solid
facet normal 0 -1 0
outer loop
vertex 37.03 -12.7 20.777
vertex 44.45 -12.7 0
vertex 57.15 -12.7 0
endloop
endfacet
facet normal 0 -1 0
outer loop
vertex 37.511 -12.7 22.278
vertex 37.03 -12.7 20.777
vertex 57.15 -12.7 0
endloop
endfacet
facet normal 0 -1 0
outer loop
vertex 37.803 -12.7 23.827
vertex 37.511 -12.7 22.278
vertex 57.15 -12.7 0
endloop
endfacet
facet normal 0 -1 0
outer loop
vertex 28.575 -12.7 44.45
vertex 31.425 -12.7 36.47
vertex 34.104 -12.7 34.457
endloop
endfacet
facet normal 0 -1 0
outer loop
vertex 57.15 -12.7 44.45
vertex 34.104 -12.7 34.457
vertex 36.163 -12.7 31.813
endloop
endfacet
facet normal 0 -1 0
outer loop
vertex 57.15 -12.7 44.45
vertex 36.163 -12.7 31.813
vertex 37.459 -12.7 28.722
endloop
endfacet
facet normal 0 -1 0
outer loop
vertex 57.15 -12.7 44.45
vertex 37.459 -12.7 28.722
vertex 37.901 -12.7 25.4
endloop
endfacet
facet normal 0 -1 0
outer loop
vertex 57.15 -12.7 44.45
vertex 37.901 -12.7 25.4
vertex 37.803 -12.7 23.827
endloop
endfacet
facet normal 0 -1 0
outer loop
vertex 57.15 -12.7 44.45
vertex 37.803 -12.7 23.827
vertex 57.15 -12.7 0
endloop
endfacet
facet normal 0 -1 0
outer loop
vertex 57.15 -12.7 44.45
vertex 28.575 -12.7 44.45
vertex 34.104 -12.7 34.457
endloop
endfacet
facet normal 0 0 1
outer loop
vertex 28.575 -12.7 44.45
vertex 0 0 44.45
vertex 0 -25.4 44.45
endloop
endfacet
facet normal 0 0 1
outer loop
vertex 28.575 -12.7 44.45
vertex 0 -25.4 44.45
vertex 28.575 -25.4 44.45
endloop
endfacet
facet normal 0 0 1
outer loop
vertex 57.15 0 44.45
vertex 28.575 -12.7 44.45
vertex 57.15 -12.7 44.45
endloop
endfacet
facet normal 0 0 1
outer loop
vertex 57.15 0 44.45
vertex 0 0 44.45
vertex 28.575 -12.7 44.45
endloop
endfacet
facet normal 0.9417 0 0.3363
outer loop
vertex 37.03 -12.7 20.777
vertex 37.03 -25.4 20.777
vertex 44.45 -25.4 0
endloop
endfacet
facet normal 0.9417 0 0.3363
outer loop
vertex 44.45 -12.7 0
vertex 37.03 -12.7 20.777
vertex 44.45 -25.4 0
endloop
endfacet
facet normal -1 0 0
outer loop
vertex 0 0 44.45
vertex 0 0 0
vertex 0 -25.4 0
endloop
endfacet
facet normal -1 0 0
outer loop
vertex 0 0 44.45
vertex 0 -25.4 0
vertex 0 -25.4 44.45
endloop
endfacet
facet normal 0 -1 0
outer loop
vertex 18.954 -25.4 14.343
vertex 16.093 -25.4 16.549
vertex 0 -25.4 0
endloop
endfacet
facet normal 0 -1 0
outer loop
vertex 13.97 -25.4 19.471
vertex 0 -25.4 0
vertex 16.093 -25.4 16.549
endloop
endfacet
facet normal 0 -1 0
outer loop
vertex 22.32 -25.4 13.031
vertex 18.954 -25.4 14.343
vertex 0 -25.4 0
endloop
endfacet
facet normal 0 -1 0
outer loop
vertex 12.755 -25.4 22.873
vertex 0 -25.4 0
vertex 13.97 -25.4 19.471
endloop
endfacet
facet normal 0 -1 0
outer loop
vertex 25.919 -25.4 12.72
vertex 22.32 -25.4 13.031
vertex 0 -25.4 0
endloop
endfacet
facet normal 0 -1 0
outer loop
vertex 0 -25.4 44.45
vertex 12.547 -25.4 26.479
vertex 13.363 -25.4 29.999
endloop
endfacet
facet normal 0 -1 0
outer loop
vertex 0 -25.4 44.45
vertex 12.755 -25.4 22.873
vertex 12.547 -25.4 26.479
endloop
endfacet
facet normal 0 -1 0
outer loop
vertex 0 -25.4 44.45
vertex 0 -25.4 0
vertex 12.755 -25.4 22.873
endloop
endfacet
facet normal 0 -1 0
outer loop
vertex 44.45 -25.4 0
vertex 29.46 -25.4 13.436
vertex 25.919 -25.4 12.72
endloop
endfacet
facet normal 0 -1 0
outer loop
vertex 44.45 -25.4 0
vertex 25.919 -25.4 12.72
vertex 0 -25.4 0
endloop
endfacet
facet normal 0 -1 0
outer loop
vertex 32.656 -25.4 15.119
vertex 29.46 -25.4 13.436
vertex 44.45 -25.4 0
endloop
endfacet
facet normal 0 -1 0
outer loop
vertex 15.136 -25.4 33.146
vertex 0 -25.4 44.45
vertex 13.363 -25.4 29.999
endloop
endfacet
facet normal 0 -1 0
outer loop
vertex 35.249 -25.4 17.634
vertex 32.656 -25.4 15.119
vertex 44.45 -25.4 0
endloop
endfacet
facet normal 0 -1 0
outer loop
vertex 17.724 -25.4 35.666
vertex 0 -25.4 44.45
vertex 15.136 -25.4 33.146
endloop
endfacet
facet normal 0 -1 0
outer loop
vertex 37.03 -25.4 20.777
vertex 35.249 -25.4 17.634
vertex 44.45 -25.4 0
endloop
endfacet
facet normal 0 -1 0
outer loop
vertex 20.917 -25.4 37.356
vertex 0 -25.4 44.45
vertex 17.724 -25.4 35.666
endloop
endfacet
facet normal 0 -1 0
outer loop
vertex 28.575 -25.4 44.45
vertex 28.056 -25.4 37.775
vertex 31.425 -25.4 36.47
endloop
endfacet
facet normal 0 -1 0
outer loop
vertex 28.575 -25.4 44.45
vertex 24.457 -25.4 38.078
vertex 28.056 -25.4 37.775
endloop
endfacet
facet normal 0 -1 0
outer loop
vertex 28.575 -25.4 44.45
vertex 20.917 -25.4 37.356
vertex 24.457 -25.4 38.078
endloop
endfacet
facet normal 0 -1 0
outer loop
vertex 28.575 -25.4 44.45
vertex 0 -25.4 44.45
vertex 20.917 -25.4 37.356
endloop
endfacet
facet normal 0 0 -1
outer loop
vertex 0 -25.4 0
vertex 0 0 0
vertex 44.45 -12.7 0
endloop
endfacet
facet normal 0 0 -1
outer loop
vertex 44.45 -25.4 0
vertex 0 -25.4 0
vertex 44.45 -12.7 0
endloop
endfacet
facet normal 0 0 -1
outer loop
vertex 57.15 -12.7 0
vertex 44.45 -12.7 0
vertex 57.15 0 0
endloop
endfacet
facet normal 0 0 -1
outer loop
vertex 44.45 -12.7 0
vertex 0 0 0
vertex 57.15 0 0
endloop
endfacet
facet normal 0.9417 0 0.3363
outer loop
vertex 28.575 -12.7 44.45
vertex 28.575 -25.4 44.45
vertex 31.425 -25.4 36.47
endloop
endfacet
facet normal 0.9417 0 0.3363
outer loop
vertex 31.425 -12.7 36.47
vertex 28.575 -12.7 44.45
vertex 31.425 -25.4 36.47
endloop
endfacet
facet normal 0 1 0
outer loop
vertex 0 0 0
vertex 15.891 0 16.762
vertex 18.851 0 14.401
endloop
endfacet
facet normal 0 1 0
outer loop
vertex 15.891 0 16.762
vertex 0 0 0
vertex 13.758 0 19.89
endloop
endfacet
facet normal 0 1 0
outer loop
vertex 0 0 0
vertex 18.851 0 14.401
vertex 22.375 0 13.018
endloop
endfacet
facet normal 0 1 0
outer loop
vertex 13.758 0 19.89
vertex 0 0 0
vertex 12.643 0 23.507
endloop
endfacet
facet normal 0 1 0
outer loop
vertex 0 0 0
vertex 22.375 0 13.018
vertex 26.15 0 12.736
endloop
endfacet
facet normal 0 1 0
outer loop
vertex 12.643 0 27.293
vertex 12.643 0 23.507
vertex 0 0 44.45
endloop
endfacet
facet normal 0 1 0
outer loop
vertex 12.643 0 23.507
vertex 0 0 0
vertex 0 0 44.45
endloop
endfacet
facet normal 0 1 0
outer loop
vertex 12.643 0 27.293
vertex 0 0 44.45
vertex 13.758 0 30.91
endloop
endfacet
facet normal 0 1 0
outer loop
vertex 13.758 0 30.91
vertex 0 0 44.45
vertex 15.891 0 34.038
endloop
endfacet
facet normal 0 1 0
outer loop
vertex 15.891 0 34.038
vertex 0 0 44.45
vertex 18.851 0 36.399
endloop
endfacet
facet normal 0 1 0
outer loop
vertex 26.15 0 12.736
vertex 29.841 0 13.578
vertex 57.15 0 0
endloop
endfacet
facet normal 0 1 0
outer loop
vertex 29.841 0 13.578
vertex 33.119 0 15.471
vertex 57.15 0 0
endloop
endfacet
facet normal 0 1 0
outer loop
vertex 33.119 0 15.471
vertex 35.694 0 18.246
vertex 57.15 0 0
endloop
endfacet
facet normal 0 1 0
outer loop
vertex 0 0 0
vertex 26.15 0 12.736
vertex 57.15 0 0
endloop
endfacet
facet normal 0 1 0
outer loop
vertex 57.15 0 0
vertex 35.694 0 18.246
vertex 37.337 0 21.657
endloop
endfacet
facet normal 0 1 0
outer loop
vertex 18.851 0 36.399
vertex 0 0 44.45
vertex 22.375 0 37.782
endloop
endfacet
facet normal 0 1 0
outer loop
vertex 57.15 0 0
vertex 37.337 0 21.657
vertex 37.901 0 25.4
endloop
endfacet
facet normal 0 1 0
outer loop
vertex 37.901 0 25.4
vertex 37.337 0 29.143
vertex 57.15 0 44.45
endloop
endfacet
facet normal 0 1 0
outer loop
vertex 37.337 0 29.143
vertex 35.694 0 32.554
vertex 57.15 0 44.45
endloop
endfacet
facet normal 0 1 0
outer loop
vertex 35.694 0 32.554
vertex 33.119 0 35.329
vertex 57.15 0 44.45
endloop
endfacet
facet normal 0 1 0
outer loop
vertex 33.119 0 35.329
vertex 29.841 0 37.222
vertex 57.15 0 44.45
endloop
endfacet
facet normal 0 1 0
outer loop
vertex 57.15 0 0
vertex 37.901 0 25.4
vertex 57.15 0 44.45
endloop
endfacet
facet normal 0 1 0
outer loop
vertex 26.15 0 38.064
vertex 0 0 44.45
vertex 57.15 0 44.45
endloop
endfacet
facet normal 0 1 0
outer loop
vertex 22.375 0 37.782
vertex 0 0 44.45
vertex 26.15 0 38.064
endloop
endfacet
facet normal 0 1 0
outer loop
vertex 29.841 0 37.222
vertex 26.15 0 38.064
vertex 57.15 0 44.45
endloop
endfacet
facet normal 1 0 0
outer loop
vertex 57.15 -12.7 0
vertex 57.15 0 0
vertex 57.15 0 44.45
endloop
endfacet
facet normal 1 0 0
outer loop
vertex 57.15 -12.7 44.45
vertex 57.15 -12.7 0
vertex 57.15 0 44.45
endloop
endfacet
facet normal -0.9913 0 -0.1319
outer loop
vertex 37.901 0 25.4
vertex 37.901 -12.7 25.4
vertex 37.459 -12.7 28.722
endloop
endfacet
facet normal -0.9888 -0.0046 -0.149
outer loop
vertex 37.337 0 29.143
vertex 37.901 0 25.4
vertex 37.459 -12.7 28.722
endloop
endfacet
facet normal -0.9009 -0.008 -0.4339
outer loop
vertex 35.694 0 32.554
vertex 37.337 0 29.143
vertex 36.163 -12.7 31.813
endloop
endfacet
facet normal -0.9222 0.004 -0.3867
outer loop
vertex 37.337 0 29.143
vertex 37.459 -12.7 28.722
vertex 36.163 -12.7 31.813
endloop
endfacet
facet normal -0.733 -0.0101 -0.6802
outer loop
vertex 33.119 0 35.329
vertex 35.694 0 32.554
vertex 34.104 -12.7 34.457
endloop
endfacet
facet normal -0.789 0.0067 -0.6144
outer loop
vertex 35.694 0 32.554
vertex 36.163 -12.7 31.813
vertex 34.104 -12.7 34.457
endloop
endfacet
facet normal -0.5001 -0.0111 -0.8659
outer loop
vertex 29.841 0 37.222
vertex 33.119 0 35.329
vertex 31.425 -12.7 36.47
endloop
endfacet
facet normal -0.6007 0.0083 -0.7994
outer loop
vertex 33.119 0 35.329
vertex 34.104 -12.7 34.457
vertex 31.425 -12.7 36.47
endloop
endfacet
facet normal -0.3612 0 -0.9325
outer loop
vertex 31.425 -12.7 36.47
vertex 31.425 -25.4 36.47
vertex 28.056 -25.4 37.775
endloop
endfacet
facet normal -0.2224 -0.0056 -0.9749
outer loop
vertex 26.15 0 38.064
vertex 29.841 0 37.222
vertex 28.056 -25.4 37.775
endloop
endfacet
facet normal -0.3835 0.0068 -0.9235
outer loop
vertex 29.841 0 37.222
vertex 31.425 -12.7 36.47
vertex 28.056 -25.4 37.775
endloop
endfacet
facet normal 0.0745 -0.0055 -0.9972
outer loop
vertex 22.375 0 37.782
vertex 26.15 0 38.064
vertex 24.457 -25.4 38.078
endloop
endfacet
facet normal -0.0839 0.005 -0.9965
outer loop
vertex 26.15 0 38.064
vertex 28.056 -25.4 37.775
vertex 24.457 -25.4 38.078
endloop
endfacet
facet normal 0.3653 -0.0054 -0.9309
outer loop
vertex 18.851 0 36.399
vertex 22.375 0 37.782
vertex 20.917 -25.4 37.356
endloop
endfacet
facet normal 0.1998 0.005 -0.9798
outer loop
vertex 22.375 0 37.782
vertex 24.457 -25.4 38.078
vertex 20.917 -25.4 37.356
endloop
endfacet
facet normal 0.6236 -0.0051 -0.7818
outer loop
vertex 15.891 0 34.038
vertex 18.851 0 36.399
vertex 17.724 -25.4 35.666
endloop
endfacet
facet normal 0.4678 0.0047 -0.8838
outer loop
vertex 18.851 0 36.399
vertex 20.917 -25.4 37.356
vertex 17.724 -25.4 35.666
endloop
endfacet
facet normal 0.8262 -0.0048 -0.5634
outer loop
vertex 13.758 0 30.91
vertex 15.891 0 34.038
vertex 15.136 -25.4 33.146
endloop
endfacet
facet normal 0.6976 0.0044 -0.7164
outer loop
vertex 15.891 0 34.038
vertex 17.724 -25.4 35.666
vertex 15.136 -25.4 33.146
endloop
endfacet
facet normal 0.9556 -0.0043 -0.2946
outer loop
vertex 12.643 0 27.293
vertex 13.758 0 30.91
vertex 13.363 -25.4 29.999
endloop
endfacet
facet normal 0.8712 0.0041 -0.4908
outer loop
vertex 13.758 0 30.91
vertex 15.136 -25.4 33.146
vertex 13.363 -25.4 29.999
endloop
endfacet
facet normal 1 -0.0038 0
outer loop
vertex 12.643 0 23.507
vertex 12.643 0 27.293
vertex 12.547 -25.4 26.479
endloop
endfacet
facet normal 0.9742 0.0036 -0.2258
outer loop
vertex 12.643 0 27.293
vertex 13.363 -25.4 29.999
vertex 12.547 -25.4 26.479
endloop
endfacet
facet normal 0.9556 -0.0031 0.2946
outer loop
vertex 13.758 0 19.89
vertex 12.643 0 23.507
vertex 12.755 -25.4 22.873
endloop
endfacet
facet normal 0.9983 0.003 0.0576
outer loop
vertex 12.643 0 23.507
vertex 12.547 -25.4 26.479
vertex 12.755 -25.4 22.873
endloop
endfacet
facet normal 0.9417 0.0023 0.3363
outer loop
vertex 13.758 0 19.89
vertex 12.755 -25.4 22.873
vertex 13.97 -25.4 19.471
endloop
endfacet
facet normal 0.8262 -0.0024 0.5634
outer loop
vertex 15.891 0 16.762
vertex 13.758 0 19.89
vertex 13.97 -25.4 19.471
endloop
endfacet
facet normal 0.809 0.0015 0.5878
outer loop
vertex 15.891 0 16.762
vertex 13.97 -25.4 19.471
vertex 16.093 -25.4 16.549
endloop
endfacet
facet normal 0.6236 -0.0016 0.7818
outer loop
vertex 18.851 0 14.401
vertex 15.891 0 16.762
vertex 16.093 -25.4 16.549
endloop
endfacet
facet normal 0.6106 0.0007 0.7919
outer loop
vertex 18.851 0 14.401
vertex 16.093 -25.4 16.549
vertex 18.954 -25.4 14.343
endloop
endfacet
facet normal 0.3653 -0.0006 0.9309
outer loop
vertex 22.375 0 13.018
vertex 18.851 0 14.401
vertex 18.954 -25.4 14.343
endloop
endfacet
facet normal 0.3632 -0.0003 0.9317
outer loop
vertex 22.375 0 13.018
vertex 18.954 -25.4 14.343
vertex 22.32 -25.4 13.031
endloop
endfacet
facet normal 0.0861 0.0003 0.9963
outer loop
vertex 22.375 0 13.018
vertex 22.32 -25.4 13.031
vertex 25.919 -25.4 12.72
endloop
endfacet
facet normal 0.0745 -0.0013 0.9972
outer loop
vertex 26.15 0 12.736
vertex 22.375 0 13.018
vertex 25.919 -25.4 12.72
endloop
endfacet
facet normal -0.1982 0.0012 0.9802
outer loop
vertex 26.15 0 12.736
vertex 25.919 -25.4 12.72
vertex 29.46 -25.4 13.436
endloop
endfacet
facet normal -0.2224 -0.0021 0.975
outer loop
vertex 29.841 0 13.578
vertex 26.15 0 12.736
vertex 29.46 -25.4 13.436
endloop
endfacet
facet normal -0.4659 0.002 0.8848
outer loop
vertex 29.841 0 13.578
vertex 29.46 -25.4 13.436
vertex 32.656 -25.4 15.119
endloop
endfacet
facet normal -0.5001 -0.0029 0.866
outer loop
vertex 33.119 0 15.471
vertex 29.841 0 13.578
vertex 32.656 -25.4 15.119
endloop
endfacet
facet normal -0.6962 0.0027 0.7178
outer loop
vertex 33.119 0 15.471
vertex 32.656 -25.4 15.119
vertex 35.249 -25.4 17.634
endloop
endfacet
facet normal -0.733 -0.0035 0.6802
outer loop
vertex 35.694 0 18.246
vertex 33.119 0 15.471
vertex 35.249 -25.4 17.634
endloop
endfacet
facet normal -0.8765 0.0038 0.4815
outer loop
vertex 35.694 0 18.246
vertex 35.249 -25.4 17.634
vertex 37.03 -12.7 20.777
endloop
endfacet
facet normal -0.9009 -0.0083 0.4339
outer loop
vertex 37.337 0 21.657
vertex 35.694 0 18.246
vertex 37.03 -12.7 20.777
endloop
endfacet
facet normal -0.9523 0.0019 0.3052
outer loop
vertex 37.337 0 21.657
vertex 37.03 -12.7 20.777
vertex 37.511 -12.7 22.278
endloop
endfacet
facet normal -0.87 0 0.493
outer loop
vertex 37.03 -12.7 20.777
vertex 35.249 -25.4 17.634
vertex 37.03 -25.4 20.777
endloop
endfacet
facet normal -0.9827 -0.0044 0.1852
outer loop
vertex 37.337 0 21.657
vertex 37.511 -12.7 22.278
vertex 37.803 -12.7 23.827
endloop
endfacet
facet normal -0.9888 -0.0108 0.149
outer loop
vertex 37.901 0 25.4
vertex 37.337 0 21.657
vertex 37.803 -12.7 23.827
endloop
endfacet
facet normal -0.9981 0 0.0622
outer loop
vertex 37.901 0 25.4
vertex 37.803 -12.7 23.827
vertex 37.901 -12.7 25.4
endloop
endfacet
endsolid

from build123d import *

# Parameters (mm, degrees)
F0_W     = 57.15
F0_H     = 44.45
F1_DEPTH = 25.4
F2_R     = 12.7
F3_DEPTH = 25.401
F5_DEPTH = 12.7


with BuildPart() as f1:
    # F0 (on Front) → F1 (new body)
    with BuildSketch(Plane.XZ):
        with Locations((28.575, 22.225)):
            Rectangle(F0_W, F0_H)
    extrude(amount=F1_DEPTH)

    # F2 (on face) → F3 (cut, through all)
    with BuildSketch(Plane.XZ.offset(25.4)):
        with Locations((25.2007812379, 25.4)):
            Circle(F2_R)
    extrude(amount=-F3_DEPTH, mode=Mode.SUBTRACT)

    # F4 (on face) → F5 (cut)
    with BuildSketch(Plane.XZ.offset(25.4)):
        with BuildLine():
            Line((57.15, 44.45), (28.575, 44.45))
            Line((28.575, 44.45), (31.4249152112, 36.4702374086))
            ThreePointArc((31.4249152112, 36.4702374086), (36.1629092581, 31.8126242108), (37.9007812379, 25.4))
            ThreePointArc((37.9007812379, 25.4), (37.6810755571, 23.0479256591), (37.029560182, 20.7772314905))
            Line((37.029560182, 20.7772314905), (44.45, 0))
            Line((44.45, 0), (57.15, 0))
            Line((57.15, 0), (57.15, 44.45))
        make_face()
    extrude(amount=-F5_DEPTH, mode=Mode.SUBTRACT)


solid = f1.part
